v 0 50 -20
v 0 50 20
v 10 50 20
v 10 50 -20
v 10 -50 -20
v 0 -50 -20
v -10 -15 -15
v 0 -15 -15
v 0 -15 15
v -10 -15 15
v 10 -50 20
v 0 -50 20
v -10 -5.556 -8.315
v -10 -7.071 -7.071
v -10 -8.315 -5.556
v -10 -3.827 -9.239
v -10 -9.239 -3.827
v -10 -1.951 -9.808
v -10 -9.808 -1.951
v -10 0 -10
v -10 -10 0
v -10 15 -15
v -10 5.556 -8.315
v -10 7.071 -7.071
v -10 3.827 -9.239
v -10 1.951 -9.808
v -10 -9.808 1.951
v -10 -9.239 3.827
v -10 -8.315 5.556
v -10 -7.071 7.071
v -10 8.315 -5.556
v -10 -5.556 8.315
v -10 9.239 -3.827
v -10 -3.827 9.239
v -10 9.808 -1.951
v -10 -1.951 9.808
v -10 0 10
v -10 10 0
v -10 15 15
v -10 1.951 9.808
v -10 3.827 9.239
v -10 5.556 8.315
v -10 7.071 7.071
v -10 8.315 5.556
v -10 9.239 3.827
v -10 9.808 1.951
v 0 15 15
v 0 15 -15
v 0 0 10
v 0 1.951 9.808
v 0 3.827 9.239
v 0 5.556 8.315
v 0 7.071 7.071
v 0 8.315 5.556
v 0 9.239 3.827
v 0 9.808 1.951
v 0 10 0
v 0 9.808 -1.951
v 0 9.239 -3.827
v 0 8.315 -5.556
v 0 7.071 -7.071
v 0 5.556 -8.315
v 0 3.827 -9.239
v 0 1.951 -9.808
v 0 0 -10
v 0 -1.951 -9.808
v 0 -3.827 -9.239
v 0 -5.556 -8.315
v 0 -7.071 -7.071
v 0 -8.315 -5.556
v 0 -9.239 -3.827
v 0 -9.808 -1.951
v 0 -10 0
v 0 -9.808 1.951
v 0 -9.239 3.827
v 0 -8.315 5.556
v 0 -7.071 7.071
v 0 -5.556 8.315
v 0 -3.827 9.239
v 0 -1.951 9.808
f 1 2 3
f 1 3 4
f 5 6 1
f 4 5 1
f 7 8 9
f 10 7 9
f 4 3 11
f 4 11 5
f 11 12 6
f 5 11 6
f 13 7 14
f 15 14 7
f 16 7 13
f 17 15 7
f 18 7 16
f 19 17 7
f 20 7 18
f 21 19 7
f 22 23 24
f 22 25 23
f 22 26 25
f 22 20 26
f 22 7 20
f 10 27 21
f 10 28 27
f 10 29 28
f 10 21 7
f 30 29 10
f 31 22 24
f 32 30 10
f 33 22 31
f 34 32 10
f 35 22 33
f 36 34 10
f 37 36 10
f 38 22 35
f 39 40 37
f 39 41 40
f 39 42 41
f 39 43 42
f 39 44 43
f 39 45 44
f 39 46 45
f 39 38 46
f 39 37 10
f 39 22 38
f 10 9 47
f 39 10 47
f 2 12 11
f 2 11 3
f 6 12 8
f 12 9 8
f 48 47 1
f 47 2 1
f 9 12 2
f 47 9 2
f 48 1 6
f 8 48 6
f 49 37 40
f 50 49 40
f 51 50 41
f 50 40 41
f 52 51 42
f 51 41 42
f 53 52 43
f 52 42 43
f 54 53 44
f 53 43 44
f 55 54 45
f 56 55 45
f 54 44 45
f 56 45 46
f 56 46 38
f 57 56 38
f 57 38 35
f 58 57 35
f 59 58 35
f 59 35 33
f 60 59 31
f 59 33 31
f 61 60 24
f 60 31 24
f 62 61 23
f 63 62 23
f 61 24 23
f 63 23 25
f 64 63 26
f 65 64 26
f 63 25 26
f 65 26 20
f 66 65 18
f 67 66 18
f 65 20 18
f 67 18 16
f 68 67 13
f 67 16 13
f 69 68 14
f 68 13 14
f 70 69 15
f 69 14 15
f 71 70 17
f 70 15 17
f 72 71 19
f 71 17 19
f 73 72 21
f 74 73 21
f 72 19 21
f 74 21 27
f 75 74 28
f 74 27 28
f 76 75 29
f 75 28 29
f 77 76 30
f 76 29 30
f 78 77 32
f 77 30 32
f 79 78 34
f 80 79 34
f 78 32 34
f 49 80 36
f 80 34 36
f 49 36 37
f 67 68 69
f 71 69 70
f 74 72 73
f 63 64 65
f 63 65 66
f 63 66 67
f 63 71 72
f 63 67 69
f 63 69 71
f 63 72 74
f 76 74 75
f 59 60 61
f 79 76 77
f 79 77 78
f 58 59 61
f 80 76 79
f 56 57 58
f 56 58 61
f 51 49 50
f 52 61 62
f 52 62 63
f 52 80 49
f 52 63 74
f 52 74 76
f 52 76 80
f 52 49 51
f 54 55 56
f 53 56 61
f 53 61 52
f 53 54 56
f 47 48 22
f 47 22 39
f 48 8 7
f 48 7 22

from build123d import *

# Parameters (mm, degrees)
SKETCH1_W           = 40
SKETCH1_H           = 100
BOSS_EXTRUDE1_DEPTH = 10
SKETCH2_W           = 30
SKETCH2_H           = 30
BOSS_EXTRUDE2_DEPTH = 10
SKETCH3_R           = 10
CUT_EXTRUDE1_DEPTH  = 10


with BuildPart() as part:
    # Sketch1 → Boss-Extrude1 (new body)
    with BuildSketch(Plane(origin=(0, 0, 0), x_dir=(0, 0, -1), z_dir=(1, 0, 0))):
        Rectangle(SKETCH1_W, SKETCH1_H)
    extrude(amount=BOSS_EXTRUDE1_DEPTH)

    # Sketch2 → Boss-Extrude2 (add)
    with BuildSketch(Plane.ZY):
        Rectangle(SKETCH2_W, SKETCH2_H)
    extrude(amount=BOSS_EXTRUDE2_DEPTH)

    # Sketch3 → Cut-Extrude1 (cut)
    with BuildSketch(Plane.ZY.offset(10)):
        Circle(SKETCH3_R)
    extrude(amount=-CUT_EXTRUDE1_DEPTH, mode=Mode.SUBTRACT)


solid = part.part
